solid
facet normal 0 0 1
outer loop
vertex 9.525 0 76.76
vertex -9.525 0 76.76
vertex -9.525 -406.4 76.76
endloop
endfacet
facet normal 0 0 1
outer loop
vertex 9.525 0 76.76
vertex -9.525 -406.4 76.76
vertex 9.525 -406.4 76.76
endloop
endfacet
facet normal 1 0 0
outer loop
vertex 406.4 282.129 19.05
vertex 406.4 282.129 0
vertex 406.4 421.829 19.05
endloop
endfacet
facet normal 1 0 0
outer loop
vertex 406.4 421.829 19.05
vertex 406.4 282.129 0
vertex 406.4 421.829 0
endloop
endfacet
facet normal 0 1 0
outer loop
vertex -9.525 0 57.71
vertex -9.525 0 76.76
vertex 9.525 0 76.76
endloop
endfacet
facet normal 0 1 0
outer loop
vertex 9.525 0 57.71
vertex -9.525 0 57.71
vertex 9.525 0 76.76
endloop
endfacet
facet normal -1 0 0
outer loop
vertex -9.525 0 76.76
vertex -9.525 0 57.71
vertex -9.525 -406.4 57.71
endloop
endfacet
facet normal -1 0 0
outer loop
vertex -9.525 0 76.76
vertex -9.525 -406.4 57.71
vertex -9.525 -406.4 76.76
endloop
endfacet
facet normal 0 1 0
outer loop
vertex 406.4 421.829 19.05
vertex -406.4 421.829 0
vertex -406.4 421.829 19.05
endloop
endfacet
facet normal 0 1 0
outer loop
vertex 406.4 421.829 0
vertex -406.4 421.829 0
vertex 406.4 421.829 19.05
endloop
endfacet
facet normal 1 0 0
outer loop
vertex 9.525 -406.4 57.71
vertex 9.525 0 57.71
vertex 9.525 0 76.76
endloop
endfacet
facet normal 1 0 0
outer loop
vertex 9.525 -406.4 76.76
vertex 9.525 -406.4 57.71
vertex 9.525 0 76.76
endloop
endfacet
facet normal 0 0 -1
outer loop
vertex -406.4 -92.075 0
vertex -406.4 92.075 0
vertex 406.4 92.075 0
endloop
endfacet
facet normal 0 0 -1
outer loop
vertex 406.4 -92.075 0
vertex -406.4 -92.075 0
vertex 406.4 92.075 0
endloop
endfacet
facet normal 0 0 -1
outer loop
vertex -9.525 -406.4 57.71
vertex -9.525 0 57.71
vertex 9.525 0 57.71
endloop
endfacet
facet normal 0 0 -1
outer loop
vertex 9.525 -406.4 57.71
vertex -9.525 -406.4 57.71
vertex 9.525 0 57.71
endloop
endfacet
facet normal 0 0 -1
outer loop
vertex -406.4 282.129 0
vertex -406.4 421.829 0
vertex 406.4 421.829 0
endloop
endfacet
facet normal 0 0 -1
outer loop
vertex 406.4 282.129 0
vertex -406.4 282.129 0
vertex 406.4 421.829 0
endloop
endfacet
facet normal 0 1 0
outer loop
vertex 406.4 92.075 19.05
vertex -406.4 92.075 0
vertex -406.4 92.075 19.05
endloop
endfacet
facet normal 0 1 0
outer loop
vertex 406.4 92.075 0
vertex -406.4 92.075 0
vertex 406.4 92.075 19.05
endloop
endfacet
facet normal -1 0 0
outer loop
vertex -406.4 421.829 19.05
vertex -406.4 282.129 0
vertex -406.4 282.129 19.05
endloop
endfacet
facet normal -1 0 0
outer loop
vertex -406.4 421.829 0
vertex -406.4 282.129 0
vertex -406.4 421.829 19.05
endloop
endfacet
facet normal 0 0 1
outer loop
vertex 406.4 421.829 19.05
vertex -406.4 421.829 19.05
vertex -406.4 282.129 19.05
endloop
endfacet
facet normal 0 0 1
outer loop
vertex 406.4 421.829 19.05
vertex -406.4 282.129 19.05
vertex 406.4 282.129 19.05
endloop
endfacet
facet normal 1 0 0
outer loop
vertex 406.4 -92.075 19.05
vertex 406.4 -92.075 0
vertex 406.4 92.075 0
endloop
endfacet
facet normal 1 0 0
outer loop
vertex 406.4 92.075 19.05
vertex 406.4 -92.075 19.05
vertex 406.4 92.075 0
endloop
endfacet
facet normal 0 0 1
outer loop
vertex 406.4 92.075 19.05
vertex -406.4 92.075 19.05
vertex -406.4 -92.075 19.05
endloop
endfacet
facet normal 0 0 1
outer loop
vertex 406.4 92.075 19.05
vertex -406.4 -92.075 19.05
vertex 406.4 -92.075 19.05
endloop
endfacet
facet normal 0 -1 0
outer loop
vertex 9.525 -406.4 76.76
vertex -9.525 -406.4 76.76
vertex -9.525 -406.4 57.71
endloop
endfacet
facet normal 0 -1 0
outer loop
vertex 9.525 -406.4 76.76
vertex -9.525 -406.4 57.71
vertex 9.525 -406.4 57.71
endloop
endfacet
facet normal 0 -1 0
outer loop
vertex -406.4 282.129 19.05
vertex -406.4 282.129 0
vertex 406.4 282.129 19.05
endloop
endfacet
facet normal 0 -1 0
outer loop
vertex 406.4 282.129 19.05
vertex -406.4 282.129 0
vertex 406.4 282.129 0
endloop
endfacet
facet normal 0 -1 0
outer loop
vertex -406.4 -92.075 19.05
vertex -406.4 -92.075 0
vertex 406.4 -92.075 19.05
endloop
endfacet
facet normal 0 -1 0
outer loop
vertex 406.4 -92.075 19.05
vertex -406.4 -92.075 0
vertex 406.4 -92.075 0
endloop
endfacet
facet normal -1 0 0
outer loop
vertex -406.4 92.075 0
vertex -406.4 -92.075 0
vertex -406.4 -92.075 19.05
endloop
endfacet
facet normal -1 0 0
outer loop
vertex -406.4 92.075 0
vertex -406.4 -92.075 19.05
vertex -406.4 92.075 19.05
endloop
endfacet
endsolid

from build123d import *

# Parameters (mm, degrees)
F0_W     = 812.8
F0_H     = 184.15
F1_DEPTH = 19.05
F2_W     = 19.05
F2_H     = 19.05
F3_DEPTH = 406.4
F4_W     = 812.8
F4_H     = 139.7
F5_DEPTH = 19.05


with BuildPart() as f1:
    # F0 (on Top) → F1 (new body)
    with BuildSketch(Plane.XY):
        Rectangle(F0_W, F0_H)
    extrude(amount=F1_DEPTH)


with BuildPart() as f3:
    # F2 (on Front) → F3 (new body)
    with BuildSketch(Plane.XZ):
        with Locations((0, 67.235264)):
            Rectangle(F2_W, F2_H)
    extrude(amount=F3_DEPTH)


with BuildPart() as f5:
    # F4 (on Top) → F5 (new body)
    with BuildSketch(Plane.XY):
        with Locations((0, 351.979484)):
            Rectangle(F4_W, F4_H)
    extrude(amount=F5_DEPTH)


solid = Compound([f1.part, f3.part, f5.part])
